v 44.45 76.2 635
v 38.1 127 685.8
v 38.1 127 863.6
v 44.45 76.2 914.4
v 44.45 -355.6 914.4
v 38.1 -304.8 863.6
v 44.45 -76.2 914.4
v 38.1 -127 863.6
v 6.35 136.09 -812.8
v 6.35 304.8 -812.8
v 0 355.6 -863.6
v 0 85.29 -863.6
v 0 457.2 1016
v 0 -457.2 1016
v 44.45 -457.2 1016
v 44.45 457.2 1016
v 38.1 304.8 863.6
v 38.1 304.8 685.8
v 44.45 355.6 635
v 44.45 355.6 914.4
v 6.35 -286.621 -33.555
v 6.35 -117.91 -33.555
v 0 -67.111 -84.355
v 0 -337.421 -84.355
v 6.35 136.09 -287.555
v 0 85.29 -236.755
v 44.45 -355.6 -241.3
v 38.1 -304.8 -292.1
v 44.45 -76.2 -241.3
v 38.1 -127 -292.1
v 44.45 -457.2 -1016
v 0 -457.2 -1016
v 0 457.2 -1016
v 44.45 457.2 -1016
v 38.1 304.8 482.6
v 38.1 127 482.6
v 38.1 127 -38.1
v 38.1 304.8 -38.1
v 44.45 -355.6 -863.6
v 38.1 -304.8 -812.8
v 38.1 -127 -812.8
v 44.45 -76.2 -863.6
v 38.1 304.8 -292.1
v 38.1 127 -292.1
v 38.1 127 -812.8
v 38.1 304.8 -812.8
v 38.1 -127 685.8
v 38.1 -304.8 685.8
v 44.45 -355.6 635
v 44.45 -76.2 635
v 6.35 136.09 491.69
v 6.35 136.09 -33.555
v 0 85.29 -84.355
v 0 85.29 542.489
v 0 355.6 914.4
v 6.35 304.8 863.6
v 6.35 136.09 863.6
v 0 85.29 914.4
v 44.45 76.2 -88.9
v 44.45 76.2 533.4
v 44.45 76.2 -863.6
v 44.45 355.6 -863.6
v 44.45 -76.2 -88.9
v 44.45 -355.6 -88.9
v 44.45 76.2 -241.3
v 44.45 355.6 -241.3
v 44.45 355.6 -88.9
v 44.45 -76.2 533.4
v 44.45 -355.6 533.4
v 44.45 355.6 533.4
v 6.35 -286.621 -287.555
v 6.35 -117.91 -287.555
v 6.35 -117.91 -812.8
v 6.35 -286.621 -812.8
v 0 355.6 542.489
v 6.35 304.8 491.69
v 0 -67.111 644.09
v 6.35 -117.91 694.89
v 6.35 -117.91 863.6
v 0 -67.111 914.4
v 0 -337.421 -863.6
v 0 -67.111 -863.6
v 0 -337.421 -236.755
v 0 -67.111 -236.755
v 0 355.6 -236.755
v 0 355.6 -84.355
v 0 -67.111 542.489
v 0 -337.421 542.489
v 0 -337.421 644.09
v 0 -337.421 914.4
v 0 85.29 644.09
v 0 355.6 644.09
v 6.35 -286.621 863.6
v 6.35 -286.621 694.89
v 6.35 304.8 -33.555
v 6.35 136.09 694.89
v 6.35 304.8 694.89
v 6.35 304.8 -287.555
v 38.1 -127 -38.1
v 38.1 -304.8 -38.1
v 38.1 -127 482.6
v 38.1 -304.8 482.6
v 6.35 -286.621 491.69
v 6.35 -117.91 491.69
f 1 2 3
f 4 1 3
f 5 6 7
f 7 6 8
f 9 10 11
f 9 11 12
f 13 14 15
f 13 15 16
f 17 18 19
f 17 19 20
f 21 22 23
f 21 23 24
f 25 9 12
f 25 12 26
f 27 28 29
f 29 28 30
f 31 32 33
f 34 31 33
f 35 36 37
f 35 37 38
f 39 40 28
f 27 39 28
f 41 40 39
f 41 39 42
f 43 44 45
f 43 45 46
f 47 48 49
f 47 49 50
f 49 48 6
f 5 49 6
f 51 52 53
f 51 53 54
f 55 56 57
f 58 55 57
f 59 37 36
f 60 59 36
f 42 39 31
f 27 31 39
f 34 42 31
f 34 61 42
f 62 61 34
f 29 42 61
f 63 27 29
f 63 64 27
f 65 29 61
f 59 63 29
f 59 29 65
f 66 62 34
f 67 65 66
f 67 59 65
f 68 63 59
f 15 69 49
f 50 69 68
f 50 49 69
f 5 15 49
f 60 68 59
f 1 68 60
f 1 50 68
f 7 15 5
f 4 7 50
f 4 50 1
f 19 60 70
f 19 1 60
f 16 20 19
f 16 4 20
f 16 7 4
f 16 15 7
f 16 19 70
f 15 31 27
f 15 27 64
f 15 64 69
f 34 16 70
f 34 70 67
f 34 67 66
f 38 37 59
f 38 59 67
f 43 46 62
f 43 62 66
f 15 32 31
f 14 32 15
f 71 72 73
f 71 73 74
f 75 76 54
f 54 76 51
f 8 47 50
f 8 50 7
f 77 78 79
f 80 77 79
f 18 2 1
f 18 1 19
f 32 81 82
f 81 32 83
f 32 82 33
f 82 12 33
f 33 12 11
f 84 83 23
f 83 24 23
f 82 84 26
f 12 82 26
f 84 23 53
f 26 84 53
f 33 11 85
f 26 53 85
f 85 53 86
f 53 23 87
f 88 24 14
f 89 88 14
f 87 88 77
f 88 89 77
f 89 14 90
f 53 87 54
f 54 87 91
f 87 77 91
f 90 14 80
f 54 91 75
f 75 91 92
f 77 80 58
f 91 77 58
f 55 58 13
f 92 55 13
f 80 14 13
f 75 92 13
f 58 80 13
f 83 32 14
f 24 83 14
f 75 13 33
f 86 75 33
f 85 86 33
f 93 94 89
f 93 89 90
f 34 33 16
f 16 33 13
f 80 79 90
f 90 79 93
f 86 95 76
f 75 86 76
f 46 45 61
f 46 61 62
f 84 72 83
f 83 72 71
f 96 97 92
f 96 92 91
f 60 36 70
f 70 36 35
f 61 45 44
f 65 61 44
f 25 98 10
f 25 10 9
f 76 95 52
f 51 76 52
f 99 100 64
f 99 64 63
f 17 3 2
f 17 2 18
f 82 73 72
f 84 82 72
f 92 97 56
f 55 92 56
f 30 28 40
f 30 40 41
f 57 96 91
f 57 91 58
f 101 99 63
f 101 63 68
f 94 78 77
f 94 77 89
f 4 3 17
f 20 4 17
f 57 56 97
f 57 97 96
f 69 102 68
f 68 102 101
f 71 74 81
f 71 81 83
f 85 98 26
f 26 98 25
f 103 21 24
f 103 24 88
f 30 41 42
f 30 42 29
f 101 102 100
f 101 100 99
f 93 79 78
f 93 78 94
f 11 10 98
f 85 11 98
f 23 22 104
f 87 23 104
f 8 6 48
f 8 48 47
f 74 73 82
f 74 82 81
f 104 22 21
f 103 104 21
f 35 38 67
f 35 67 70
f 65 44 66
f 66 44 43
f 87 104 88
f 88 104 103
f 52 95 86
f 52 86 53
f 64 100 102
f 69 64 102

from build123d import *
from OCP.BRepFilletAPI import BRepFilletAPI_MakeChamfer

# Parameters (mm, degrees)
SKETCH1_W           = 914.4
SKETCH1_H           = 2032
BOSS_EXTRUDE1_DEPTH = 44.45
SKETCH2_W           = 177.8
SKETCH2_H           = 520.7
SKETCH2_H_2         = 177.8
CUT_EXTRUDE1_DEPTH  = 6.35
CHAMFER1_SIZE       = 50.8
CHAMFER1_SIZE_2     = 6.35
SKETCH3_W           = 168.710436435
SKETCH3_H           = 525.244781783
SKETCH3_H_2         = 168.710436435
SKETCH3_H_3         = 525.244781782
CUT_EXTRUDE2_DEPTH  = 6.35
CHAMFER2_SIZE       = 50.8
CHAMFER2_SIZE_2     = 6.35


with BuildPart() as part:
    # Sketch1 → Boss-Extrude1 (new body)
    with BuildSketch(Plane.YZ):
        Rectangle(SKETCH1_W, SKETCH1_H)
    extrude(amount=BOSS_EXTRUDE1_DEPTH)

    # Sketch2 → Cut-Extrude1 (cut)
    with BuildSketch(Plane.YZ.offset(44.45)):
        with Locations((-215.9, 222.25)):
            Rectangle(SKETCH2_W, SKETCH2_H)
        with Locations((-215.9, 774.7)):
            Rectangle(SKETCH2_W, SKETCH2_H_2)
        with Locations((-215.9, -552.45)):
            Rectangle(SKETCH2_W, SKETCH2_H)
        with Locations((215.9, -552.45)):
            Rectangle(SKETCH2_W, SKETCH2_H)
        with Locations((215.9, 222.25)):
            Rectangle(SKETCH2_W, SKETCH2_H)
        with Locations((215.9, 774.7)):
            Rectangle(SKETCH2_W, SKETCH2_H_2)
    extrude(amount=-CUT_EXTRUDE1_DEPTH, mode=Mode.SUBTRACT)

    # Chamfer1
    chamfer1_edges_1 = [part.edges().sort_by_distance(p)[0] for p in [
        (44.45, 215.9, -812.8),
    ]]
    chamfer1_side_1 = [part.faces().sort_by_distance(p)[0] for p in [
        (44.45, 215.9, -812.927),
    ]]
    chamfer1_edges_2 = [part.edges().sort_by_distance(p)[0] for p in [
        (44.45, 304.8, -552.45),
    ]]
    chamfer1_side_2 = [part.faces().sort_by_distance(p)[0] for p in [
        (44.45, 304.927, -552.45),
    ]]
    chamfer1_edges_3 = [part.edges().sort_by_distance(p)[0] for p in [
        (44.45, 215.9, -292.1),
    ]]
    chamfer1_side_3 = [part.faces().sort_by_distance(p)[0] for p in [
        (44.45, 215.9, -291.973),
    ]]
    chamfer1_edges_4 = [part.edges().sort_by_distance(p)[0] for p in [
        (44.45, 127, -552.45),
    ]]
    chamfer1_side_4 = [part.faces().sort_by_distance(p)[0] for p in [
        (44.45, 126.873, -552.45),
    ]]
    chamfer1_edges_5 = [part.edges().sort_by_distance(p)[0] for p in [
        (44.45, -127, -552.45),
    ]]
    chamfer1_side_5 = [part.faces().sort_by_distance(p)[0] for p in [
        (44.45, -126.873, -552.45),
    ]]
    chamfer1_edges_6 = [part.edges().sort_by_distance(p)[0] for p in [
        (44.45, -215.9, -812.8),
    ]]
    chamfer1_side_6 = [part.faces().sort_by_distance(p)[0] for p in [
        (44.45, -215.9, -812.927),
    ]]
    chamfer1_edges_7 = [part.edges().sort_by_distance(p)[0] for p in [
        (44.45, -215.9, -292.1),
    ]]
    chamfer1_side_7 = [part.faces().sort_by_distance(p)[0] for p in [
        (44.45, -215.9, -291.973),
    ]]
    chamfer1_edges_8 = [part.edges().sort_by_distance(p)[0] for p in [
        (44.45, -304.8, -552.45),
    ]]
    chamfer1_side_8 = [part.faces().sort_by_distance(p)[0] for p in [
        (44.45, -304.927, -552.45),
    ]]
    chamfer1_edges_9 = [part.edges().sort_by_distance(p)[0] for p in [
        (44.45, 215.9, -38.1),
    ]]
    chamfer1_side_9 = [part.faces().sort_by_distance(p)[0] for p in [
        (44.45, 215.9, -38.227),
    ]]
    chamfer1_edges_10 = [part.edges().sort_by_distance(p)[0] for p in [
        (44.45, 304.8, 222.25),
    ]]
    chamfer1_side_10 = [part.faces().sort_by_distance(p)[0] for p in [
        (44.45, 304.927, 222.25),
    ]]
    chamfer1_edges_11 = [part.edges().sort_by_distance(p)[0] for p in [
        (44.45, 215.9, 482.6),
    ]]
    chamfer1_side_11 = [part.faces().sort_by_distance(p)[0] for p in [
        (44.45, 215.9, 482.727),
    ]]
    chamfer1_edges_12 = [part.edges().sort_by_distance(p)[0] for p in [
        (44.45, 127, 222.25),
    ]]
    chamfer1_side_12 = [part.faces().sort_by_distance(p)[0] for p in [
        (44.45, 126.873, 222.25),
    ]]
    chamfer1_edges_13 = [part.edges().sort_by_distance(p)[0] for p in [
        (44.45, -215.9, -38.1),
    ]]
    chamfer1_side_13 = [part.faces().sort_by_distance(p)[0] for p in [
        (44.45, -215.9, -38.227),
    ]]
    chamfer1_edges_14 = [part.edges().sort_by_distance(p)[0] for p in [
        (44.45, -127, 222.25),
    ]]
    chamfer1_side_14 = [part.faces().sort_by_distance(p)[0] for p in [
        (44.45, -126.873, 222.25),
    ]]
    chamfer1_edges_15 = [part.edges().sort_by_distance(p)[0] for p in [
        (44.45, -304.8, 222.25),
    ]]
    chamfer1_side_15 = [part.faces().sort_by_distance(p)[0] for p in [
        (44.45, -304.927, 222.25),
    ]]
    chamfer1_edges_16 = [part.edges().sort_by_distance(p)[0] for p in [
        (44.45, -215.9, 482.6),
    ]]
    chamfer1_side_16 = [part.faces().sort_by_distance(p)[0] for p in [
        (44.45, -215.9, 482.727),
    ]]
    chamfer1_edges_17 = [part.edges().sort_by_distance(p)[0] for p in [
        (44.45, 304.8, 774.7),
    ]]
    chamfer1_side_17 = [part.faces().sort_by_distance(p)[0] for p in [
        (44.45, 304.927, 774.7),
    ]]
    chamfer1_edges_18 = [part.edges().sort_by_distance(p)[0] for p in [
        (44.45, 215.9, 685.8),
    ]]
    chamfer1_side_18 = [part.faces().sort_by_distance(p)[0] for p in [
        (44.45, 215.9, 685.673),
    ]]
    chamfer1_edges_19 = [part.edges().sort_by_distance(p)[0] for p in [
        (44.45, 215.9, 863.6),
    ]]
    chamfer1_side_19 = [part.faces().sort_by_distance(p)[0] for p in [
        (44.45, 215.9, 863.727),
    ]]
    chamfer1_edges_20 = [part.edges().sort_by_distance(p)[0] for p in [
        (44.45, 127, 774.7),
    ]]
    chamfer1_side_20 = [part.faces().sort_by_distance(p)[0] for p in [
        (44.45, 126.873, 774.7),
    ]]
    chamfer1_edges_21 = [part.edges().sort_by_distance(p)[0] for p in [
        (44.45, -127, 774.7),
    ]]
    chamfer1_side_21 = [part.faces().sort_by_distance(p)[0] for p in [
        (44.45, -126.873, 774.7),
    ]]
    chamfer1_edges_22 = [part.edges().sort_by_distance(p)[0] for p in [
        (44.45, -215.9, 685.8),
    ]]
    chamfer1_side_22 = [part.faces().sort_by_distance(p)[0] for p in [
        (44.45, -215.9, 685.673),
    ]]
    chamfer1_edges_23 = [part.edges().sort_by_distance(p)[0] for p in [
        (44.45, -304.8, 774.7),
    ]]
    chamfer1_side_23 = [part.faces().sort_by_distance(p)[0] for p in [
        (44.45, -304.927, 774.7),
    ]]
    chamfer1_edges_24 = [part.edges().sort_by_distance(p)[0] for p in [
        (44.45, -215.9, 863.6),
    ]]
    chamfer1_side_24 = [part.faces().sort_by_distance(p)[0] for p in [
        (44.45, -215.9, 863.727),
    ]]
    chamfer1 = BRepFilletAPI_MakeChamfer(part.part.solid().wrapped)
    for e in chamfer1_edges_1:
        chamfer1.Add(CHAMFER1_SIZE - 0.0001, CHAMFER1_SIZE_2 - 0.0001, e.wrapped, chamfer1_side_1[0].wrapped)
    for e in chamfer1_edges_2:
        chamfer1.Add(CHAMFER1_SIZE - 0.0001, CHAMFER1_SIZE_2 - 0.0001, e.wrapped, chamfer1_side_2[0].wrapped)
    for e in chamfer1_edges_3:
        chamfer1.Add(CHAMFER1_SIZE - 0.0001, CHAMFER1_SIZE_2 - 0.0001, e.wrapped, chamfer1_side_3[0].wrapped)
    for e in chamfer1_edges_4:
        chamfer1.Add(CHAMFER1_SIZE - 0.0001, CHAMFER1_SIZE_2 - 0.0001, e.wrapped, chamfer1_side_4[0].wrapped)
    for e in chamfer1_edges_5:
        chamfer1.Add(CHAMFER1_SIZE - 0.0001, CHAMFER1_SIZE_2 - 0.0001, e.wrapped, chamfer1_side_5[0].wrapped)
    for e in chamfer1_edges_6:
        chamfer1.Add(CHAMFER1_SIZE - 0.0001, CHAMFER1_SIZE_2 - 0.0001, e.wrapped, chamfer1_side_6[0].wrapped)
    for e in chamfer1_edges_7:
        chamfer1.Add(CHAMFER1_SIZE - 0.0001, CHAMFER1_SIZE_2 - 0.0001, e.wrapped, chamfer1_side_7[0].wrapped)
    for e in chamfer1_edges_8:
        chamfer1.Add(CHAMFER1_SIZE - 0.0001, CHAMFER1_SIZE_2 - 0.0001, e.wrapped, chamfer1_side_8[0].wrapped)
    for e in chamfer1_edges_9:
        chamfer1.Add(CHAMFER1_SIZE - 0.0001, CHAMFER1_SIZE_2 - 0.0001, e.wrapped, chamfer1_side_9[0].wrapped)
    for e in chamfer1_edges_10:
        chamfer1.Add(CHAMFER1_SIZE - 0.0001, CHAMFER1_SIZE_2 - 0.0001, e.wrapped, chamfer1_side_10[0].wrapped)
    for e in chamfer1_edges_11:
        chamfer1.Add(CHAMFER1_SIZE - 0.0001, CHAMFER1_SIZE_2 - 0.0001, e.wrapped, chamfer1_side_11[0].wrapped)
    for e in chamfer1_edges_12:
        chamfer1.Add(CHAMFER1_SIZE - 0.0001, CHAMFER1_SIZE_2 - 0.0001, e.wrapped, chamfer1_side_12[0].wrapped)
    for e in chamfer1_edges_13:
        chamfer1.Add(CHAMFER1_SIZE - 0.0001, CHAMFER1_SIZE_2 - 0.0001, e.wrapped, chamfer1_side_13[0].wrapped)
    for e in chamfer1_edges_14:
        chamfer1.Add(CHAMFER1_SIZE - 0.0001, CHAMFER1_SIZE_2 - 0.0001, e.wrapped, chamfer1_side_14[0].wrapped)
    for e in chamfer1_edges_15:
        chamfer1.Add(CHAMFER1_SIZE - 0.0001, CHAMFER1_SIZE_2 - 0.0001, e.wrapped, chamfer1_side_15[0].wrapped)
    for e in chamfer1_edges_16:
        chamfer1.Add(CHAMFER1_SIZE - 0.0001, CHAMFER1_SIZE_2 - 0.0001, e.wrapped, chamfer1_side_16[0].wrapped)
    for e in chamfer1_edges_17:
        chamfer1.Add(CHAMFER1_SIZE - 0.0001, CHAMFER1_SIZE_2 - 0.0001, e.wrapped, chamfer1_side_17[0].wrapped)
    for e in chamfer1_edges_18:
        chamfer1.Add(CHAMFER1_SIZE - 0.0001, CHAMFER1_SIZE_2 - 0.0001, e.wrapped, chamfer1_side_18[0].wrapped)
    for e in chamfer1_edges_19:
        chamfer1.Add(CHAMFER1_SIZE - 0.0001, CHAMFER1_SIZE_2 - 0.0001, e.wrapped, chamfer1_side_19[0].wrapped)
    for e in chamfer1_edges_20:
        chamfer1.Add(CHAMFER1_SIZE - 0.0001, CHAMFER1_SIZE_2 - 0.0001, e.wrapped, chamfer1_side_20[0].wrapped)
    for e in chamfer1_edges_21:
        chamfer1.Add(CHAMFER1_SIZE - 0.0001, CHAMFER1_SIZE_2 - 0.0001, e.wrapped, chamfer1_side_21[0].wrapped)
    for e in chamfer1_edges_22:
        chamfer1.Add(CHAMFER1_SIZE - 0.0001, CHAMFER1_SIZE_2 - 0.0001, e.wrapped, chamfer1_side_22[0].wrapped)
    for e in chamfer1_edges_23:
        chamfer1.Add(CHAMFER1_SIZE - 0.0001, CHAMFER1_SIZE_2 - 0.0001, e.wrapped, chamfer1_side_23[0].wrapped)
    for e in chamfer1_edges_24:
        chamfer1.Add(CHAMFER1_SIZE - 0.0001, CHAMFER1_SIZE_2 - 0.0001, e.wrapped, chamfer1_side_24[0].wrapped)
    add(Compound.cast(chamfer1.Shape()), mode=Mode.REPLACE)  # a hair under: the kernel refuses the full size

    # Sketch3 → Cut-Extrude2 (cut)
    with BuildSketch(Plane(origin=(0, 0, 0), x_dir=(0, -1, 0), z_dir=(-1, 0, 0))):
        with Locations((-220.444781783, 229.067172674)):
            Rectangle(SKETCH3_W, SKETCH3_H)
        with Locations((-220.444781783, 779.244781783)):
            Rectangle(SKETCH3_W, SKETCH3_H_2)
        with Locations((-220.444781783, -550.177609109)):
            Rectangle(SKETCH3_W, SKETCH3_H_3)
        with Locations((202.265654653, -550.177609109)):
            Rectangle(SKETCH3_W, SKETCH3_H_3)
        with Locations((202.265654653, 229.067172674)):
            Rectangle(SKETCH3_W, SKETCH3_H)
        with Locations((202.265654653, 779.244781783)):
            Rectangle(SKETCH3_W, SKETCH3_H_2)
    extrude(amount=-CUT_EXTRUDE2_DEPTH, mode=Mode.SUBTRACT)

    # Chamfer2
    chamfer2_edges_1 = [part.edges().sort_by_distance(p)[0] for p in [
        (0, -202.265654653, -812.8),
    ]]
    chamfer2_side_1 = [part.faces().sort_by_distance(p)[0] for p in [
        (0, -202.265654653, -812.927),
    ]]
    chamfer2_edges_2 = [part.edges().sort_by_distance(p)[0] for p in [
        (0, -286.62087287, -550.177609109),
    ]]
    chamfer2_side_2 = [part.faces().sort_by_distance(p)[0] for p in [
        (0, -286.74787287, -550.177609109),
    ]]
    chamfer2_edges_3 = [part.edges().sort_by_distance(p)[0] for p in [
        (0, -202.265654653, -287.555218218),
    ]]
    chamfer2_side_3 = [part.faces().sort_by_distance(p)[0] for p in [
        (0, -202.265654653, -287.428218218),
    ]]
    chamfer2_edges_4 = [part.edges().sort_by_distance(p)[0] for p in [
        (0, -117.910436435, -550.177609109),
    ]]
    chamfer2_side_4 = [part.faces().sort_by_distance(p)[0] for p in [
        (0, -117.783436435, -550.177609109),
    ]]
    chamfer2_edges_5 = [part.edges().sort_by_distance(p)[0] for p in [
        (0, 136.089563565, -550.177609109),
    ]]
    chamfer2_side_5 = [part.faces().sort_by_distance(p)[0] for p in [
        (0, 135.962563565, -550.177609109),
    ]]
    chamfer2_edges_6 = [part.edges().sort_by_distance(p)[0] for p in [
        (0, 220.444781782, -812.8),
    ]]
    chamfer2_side_6 = [part.faces().sort_by_distance(p)[0] for p in [
        (0, 220.444781782, -812.927),
    ]]
    chamfer2_edges_7 = [part.edges().sort_by_distance(p)[0] for p in [
        (0, 304.8, -550.177609109),
    ]]
    chamfer2_side_7 = [part.faces().sort_by_distance(p)[0] for p in [
        (0, 304.927, -550.177609109),
    ]]
    chamfer2_edges_8 = [part.edges().sort_by_distance(p)[0] for p in [
        (0, 220.444781782, -287.555218218),
    ]]
    chamfer2_side_8 = [part.faces().sort_by_distance(p)[0] for p in [
        (0, 220.444781782, -287.428218218),
    ]]
    chamfer2_edges_9 = [part.edges().sort_by_distance(p)[0] for p in [
        (0, -202.265654653, -33.555218218),
    ]]
    chamfer2_side_9 = [part.faces().sort_by_distance(p)[0] for p in [
        (0, -202.265654653, -33.682218218),
    ]]
    chamfer2_edges_10 = [part.edges().sort_by_distance(p)[0] for p in [
        (0, -286.62087287, 229.067172674),
    ]]
    chamfer2_side_10 = [part.faces().sort_by_distance(p)[0] for p in [
        (0, -286.74787287, 229.067172674),
    ]]
    chamfer2_edges_11 = [part.edges().sort_by_distance(p)[0] for p in [
        (0, -202.265654653, 491.689563565),
    ]]
    chamfer2_side_11 = [part.faces().sort_by_distance(p)[0] for p in [
        (0, -202.265654653, 491.816563565),
    ]]
    chamfer2_edges_12 = [part.edges().sort_by_distance(p)[0] for p in [
        (0, -117.910436435, 229.067172674),
    ]]
    chamfer2_side_12 = [part.faces().sort_by_distance(p)[0] for p in [
        (0, -117.783436435, 229.067172674),
    ]]
    chamfer2_edges_13 = [part.edges().sort_by_distance(p)[0] for p in [
        (0, 136.089563565, 229.067172674),
    ]]
    chamfer2_side_13 = [part.faces().sort_by_distance(p)[0] for p in [
        (0, 135.962563565, 229.067172674),
    ]]
    chamfer2_edges_14 = [part.edges().sort_by_distance(p)[0] for p in [
        (0, 220.444781782, -33.555218218),
    ]]
    chamfer2_side_14 = [part.faces().sort_by_distance(p)[0] for p in [
        (0, 220.444781782, -33.682218218),
    ]]
    chamfer2_edges_15 = [part.edges().sort_by_distance(p)[0] for p in [
        (0, 304.8, 229.067172674),
    ]]
    chamfer2_side_15 = [part.faces().sort_by_distance(p)[0] for p in [
        (0, 304.927, 229.067172674),
    ]]
    chamfer2_edges_16 = [part.edges().sort_by_distance(p)[0] for p in [
        (0, 220.444781782, 491.689563565),
    ]]
    chamfer2_side_16 = [part.faces().sort_by_distance(p)[0] for p in [
        (0, 220.444781782, 491.816563565),
    ]]
    chamfer2_edges_17 = [part.edges().sort_by_distance(p)[0] for p in [
        (0, -202.265654653, 694.889563565),
    ]]
    chamfer2_side_17 = [part.faces().sort_by_distance(p)[0] for p in [
        (0, -202.265654653, 694.762563565),
    ]]
    chamfer2_edges_18 = [part.edges().sort_by_distance(p)[0] for p in [
        (0, -286.62087287, 779.244781782),
    ]]
    chamfer2_side_18 = [part.faces().sort_by_distance(p)[0] for p in [
        (0, -286.74787287, 779.244781782),
    ]]
    chamfer2_edges_19 = [part.edges().sort_by_distance(p)[0] for p in [
        (0, -202.265654653, 863.6),
    ]]
    chamfer2_side_19 = [part.faces().sort_by_distance(p)[0] for p in [
        (0, -202.265654653, 863.727),
    ]]
    chamfer2_edges_20 = [part.edges().sort_by_distance(p)[0] for p in [
        (0, -117.910436435, 779.244781782),
    ]]
    chamfer2_side_20 = [part.faces().sort_by_distance(p)[0] for p in [
        (0, -117.783436435, 779.244781782),
    ]]
    chamfer2_edges_21 = [part.edges().sort_by_distance(p)[0] for p in [
        (0, 220.444781782, 694.889563565),
    ]]
    chamfer2_side_21 = [part.faces().sort_by_distance(p)[0] for p in [
        (0, 220.444781782, 694.762563565),
    ]]
    chamfer2_edges_22 = [part.edges().sort_by_distance(p)[0] for p in [
        (0, 136.089563565, 779.244781782),
    ]]
    chamfer2_side_22 = [part.faces().sort_by_distance(p)[0] for p in [
        (0, 135.962563565, 779.244781782),
    ]]
    chamfer2_edges_23 = [part.edges().sort_by_distance(p)[0] for p in [
        (0, 220.444781782, 863.6),
    ]]
    chamfer2_side_23 = [part.faces().sort_by_distance(p)[0] for p in [
        (0, 220.444781782, 863.727),
    ]]
    chamfer2_edges_24 = [part.edges().sort_by_distance(p)[0] for p in [
        (0, 304.8, 779.244781782),
    ]]
    chamfer2_side_24 = [part.faces().sort_by_distance(p)[0] for p in [
        (0, 304.927, 779.244781782),
    ]]
    chamfer2 = BRepFilletAPI_MakeChamfer(part.part.solid().wrapped)
    for e in chamfer2_edges_1:
        chamfer2.Add(CHAMFER2_SIZE - 0.0001, CHAMFER2_SIZE_2 - 0.0001, e.wrapped, chamfer2_side_1[0].wrapped)
    for e in chamfer2_edges_2:
        chamfer2.Add(CHAMFER2_SIZE - 0.0001, CHAMFER2_SIZE_2 - 0.0001, e.wrapped, chamfer2_side_2[0].wrapped)
    for e in chamfer2_edges_3:
        chamfer2.Add(CHAMFER2_SIZE - 0.0001, CHAMFER2_SIZE_2 - 0.0001, e.wrapped, chamfer2_side_3[0].wrapped)
    for e in chamfer2_edges_4:
        chamfer2.Add(CHAMFER2_SIZE - 0.0001, CHAMFER2_SIZE_2 - 0.0001, e.wrapped, chamfer2_side_4[0].wrapped)
    for e in chamfer2_edges_5:
        chamfer2.Add(CHAMFER2_SIZE - 0.0001, CHAMFER2_SIZE_2 - 0.0001, e.wrapped, chamfer2_side_5[0].wrapped)
    for e in chamfer2_edges_6:
        chamfer2.Add(CHAMFER2_SIZE - 0.0001, CHAMFER2_SIZE_2 - 0.0001, e.wrapped, chamfer2_side_6[0].wrapped)
    for e in chamfer2_edges_7:
        chamfer2.Add(CHAMFER2_SIZE - 0.0001, CHAMFER2_SIZE_2 - 0.0001, e.wrapped, chamfer2_side_7[0].wrapped)
    for e in chamfer2_edges_8:
        chamfer2.Add(CHAMFER2_SIZE - 0.0001, CHAMFER2_SIZE_2 - 0.0001, e.wrapped, chamfer2_side_8[0].wrapped)
    for e in chamfer2_edges_9:
        chamfer2.Add(CHAMFER2_SIZE - 0.0001, CHAMFER2_SIZE_2 - 0.0001, e.wrapped, chamfer2_side_9[0].wrapped)
    for e in chamfer2_edges_10:
        chamfer2.Add(CHAMFER2_SIZE - 0.0001, CHAMFER2_SIZE_2 - 0.0001, e.wrapped, chamfer2_side_10[0].wrapped)
    for e in chamfer2_edges_11:
        chamfer2.Add(CHAMFER2_SIZE - 0.0001, CHAMFER2_SIZE_2 - 0.0001, e.wrapped, chamfer2_side_11[0].wrapped)
    for e in chamfer2_edges_12:
        chamfer2.Add(CHAMFER2_SIZE - 0.0001, CHAMFER2_SIZE_2 - 0.0001, e.wrapped, chamfer2_side_12[0].wrapped)
    for e in chamfer2_edges_13:
        chamfer2.Add(CHAMFER2_SIZE - 0.0001, CHAMFER2_SIZE_2 - 0.0001, e.wrapped, chamfer2_side_13[0].wrapped)
    for e in chamfer2_edges_14:
        chamfer2.Add(CHAMFER2_SIZE - 0.0001, CHAMFER2_SIZE_2 - 0.0001, e.wrapped, chamfer2_side_14[0].wrapped)
    for e in chamfer2_edges_15:
        chamfer2.Add(CHAMFER2_SIZE - 0.0001, CHAMFER2_SIZE_2 - 0.0001, e.wrapped, chamfer2_side_15[0].wrapped)
    for e in chamfer2_edges_16:
        chamfer2.Add(CHAMFER2_SIZE - 0.0001, CHAMFER2_SIZE_2 - 0.0001, e.wrapped, chamfer2_side_16[0].wrapped)
    for e in chamfer2_edges_17:
        chamfer2.Add(CHAMFER2_SIZE - 0.0001, CHAMFER2_SIZE_2 - 0.0001, e.wrapped, chamfer2_side_17[0].wrapped)
    for e in chamfer2_edges_18:
        chamfer2.Add(CHAMFER2_SIZE - 0.0001, CHAMFER2_SIZE_2 - 0.0001, e.wrapped, chamfer2_side_18[0].wrapped)
    for e in chamfer2_edges_19:
        chamfer2.Add(CHAMFER2_SIZE - 0.0001, CHAMFER2_SIZE_2 - 0.0001, e.wrapped, chamfer2_side_19[0].wrapped)
    for e in chamfer2_edges_20:
        chamfer2.Add(CHAMFER2_SIZE - 0.0001, CHAMFER2_SIZE_2 - 0.0001, e.wrapped, chamfer2_side_20[0].wrapped)
    for e in chamfer2_edges_21:
        chamfer2.Add(CHAMFER2_SIZE - 0.0001, CHAMFER2_SIZE_2 - 0.0001, e.wrapped, chamfer2_side_21[0].wrapped)
    for e in chamfer2_edges_22:
        chamfer2.Add(CHAMFER2_SIZE - 0.0001, CHAMFER2_SIZE_2 - 0.0001, e.wrapped, chamfer2_side_22[0].wrapped)
    for e in chamfer2_edges_23:
        chamfer2.Add(CHAMFER2_SIZE - 0.0001, CHAMFER2_SIZE_2 - 0.0001, e.wrapped, chamfer2_side_23[0].wrapped)
    for e in chamfer2_edges_24:
        chamfer2.Add(CHAMFER2_SIZE - 0.0001, CHAMFER2_SIZE_2 - 0.0001, e.wrapped, chamfer2_side_24[0].wrapped)
    add(Compound.cast(chamfer2.Shape()), mode=Mode.REPLACE)  # a hair under: the kernel refuses the full size


solid = part.part
